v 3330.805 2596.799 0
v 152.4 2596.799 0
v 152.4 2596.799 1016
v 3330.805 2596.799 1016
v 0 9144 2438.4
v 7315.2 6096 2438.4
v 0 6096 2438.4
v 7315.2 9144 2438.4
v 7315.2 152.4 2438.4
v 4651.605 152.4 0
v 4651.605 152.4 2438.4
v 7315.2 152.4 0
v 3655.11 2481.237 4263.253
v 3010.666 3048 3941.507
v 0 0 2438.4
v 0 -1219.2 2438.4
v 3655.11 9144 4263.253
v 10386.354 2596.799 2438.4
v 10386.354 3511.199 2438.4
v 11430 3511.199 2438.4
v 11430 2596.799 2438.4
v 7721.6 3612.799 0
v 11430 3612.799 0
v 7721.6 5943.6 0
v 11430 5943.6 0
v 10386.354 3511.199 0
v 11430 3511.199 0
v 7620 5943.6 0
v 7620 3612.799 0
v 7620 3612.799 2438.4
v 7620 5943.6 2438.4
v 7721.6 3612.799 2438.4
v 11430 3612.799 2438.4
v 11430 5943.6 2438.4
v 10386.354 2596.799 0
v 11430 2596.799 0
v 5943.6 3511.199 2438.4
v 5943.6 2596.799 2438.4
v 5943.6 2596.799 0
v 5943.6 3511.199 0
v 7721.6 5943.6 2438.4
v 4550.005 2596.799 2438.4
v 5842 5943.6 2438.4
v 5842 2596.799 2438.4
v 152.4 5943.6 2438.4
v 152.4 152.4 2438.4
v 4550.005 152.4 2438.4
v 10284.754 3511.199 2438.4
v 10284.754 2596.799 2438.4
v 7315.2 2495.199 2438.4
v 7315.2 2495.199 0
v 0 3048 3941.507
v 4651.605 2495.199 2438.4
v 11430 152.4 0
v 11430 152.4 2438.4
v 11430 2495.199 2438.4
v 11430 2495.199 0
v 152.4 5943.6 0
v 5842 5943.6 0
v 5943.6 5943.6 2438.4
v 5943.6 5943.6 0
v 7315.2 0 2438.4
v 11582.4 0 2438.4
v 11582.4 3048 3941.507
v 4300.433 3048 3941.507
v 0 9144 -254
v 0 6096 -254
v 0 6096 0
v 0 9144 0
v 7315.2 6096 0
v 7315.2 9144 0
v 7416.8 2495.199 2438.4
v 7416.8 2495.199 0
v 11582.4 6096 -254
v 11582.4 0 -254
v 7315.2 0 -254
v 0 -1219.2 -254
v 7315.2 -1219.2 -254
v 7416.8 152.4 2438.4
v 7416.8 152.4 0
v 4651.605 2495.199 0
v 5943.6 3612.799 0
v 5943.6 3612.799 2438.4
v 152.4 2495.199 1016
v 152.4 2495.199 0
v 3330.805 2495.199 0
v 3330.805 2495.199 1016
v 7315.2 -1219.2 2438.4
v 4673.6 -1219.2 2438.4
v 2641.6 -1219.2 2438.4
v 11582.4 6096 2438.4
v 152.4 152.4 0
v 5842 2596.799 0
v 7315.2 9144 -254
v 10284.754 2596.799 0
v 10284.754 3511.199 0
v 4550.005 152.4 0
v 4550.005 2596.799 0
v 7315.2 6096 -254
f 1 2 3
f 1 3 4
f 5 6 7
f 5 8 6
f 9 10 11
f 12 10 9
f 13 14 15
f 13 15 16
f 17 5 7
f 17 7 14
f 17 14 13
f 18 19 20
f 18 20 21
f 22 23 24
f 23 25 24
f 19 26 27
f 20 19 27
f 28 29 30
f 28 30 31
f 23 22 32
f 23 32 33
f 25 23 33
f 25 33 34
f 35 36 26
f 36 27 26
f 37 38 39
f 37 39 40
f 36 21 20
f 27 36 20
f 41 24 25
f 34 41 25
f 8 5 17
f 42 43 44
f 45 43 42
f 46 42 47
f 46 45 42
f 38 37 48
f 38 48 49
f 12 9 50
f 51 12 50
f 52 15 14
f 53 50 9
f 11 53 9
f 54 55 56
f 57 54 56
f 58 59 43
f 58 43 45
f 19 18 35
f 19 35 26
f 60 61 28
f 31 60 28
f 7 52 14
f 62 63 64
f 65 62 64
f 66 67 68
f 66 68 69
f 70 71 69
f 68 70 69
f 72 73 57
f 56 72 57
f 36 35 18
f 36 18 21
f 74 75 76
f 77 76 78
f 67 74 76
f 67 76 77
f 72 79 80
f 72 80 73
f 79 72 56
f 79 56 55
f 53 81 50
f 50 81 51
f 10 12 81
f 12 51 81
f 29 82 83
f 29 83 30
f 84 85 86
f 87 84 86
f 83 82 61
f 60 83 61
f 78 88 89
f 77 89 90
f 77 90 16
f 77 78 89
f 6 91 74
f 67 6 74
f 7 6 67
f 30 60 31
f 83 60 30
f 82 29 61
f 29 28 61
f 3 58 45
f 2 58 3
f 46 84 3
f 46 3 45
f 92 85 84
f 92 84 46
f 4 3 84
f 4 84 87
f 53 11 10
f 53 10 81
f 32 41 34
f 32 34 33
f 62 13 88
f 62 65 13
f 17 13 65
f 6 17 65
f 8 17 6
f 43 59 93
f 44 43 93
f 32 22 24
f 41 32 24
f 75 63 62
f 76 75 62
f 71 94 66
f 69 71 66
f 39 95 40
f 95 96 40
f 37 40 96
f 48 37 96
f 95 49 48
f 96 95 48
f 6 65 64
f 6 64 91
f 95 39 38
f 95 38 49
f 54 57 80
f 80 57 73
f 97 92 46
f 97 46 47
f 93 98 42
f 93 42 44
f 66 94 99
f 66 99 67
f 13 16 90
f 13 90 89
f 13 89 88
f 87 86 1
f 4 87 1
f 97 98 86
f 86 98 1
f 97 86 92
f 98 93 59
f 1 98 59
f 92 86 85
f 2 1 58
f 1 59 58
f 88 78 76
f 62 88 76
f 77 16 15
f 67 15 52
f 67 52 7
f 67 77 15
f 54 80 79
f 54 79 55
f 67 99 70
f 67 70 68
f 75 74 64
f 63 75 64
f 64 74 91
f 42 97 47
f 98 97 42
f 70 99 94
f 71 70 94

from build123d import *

# Parameters (mm, degrees)
SKETCH3_W           = 11582.4
SKETCH3_H           = 6096
SKETCH3_W_2         = 4341.154286856
SKETCH3_H_2         = 914.4
SKETCH3_W_3         = 1676.4
SKETCH3_H_3         = 2330.801356814
SKETCH3_W_4         = 2663.595025017
SKETCH3_H_4         = 2342.798643186
SKETCH3_W_5         = 1043.645713144
SKETCH3_W_6         = 4013.2
SKETCH3_W_7         = 3708.4
BOSS_EXTRUDE1_DEPTH = 2438.4
SKETCH4_W           = 11582.4
SKETCH4_H           = 6096
BOSS_EXTRUDE2_DEPTH = 254
SKETCH5_W           = 3178.404974983
SKETCH5_H           = 101.6
BOSS_EXTRUDE3_DEPTH = 1016
BOSS_EXTRUDE4_DEPTH = 11582.4
SKETCH8_W           = 7315.2
SKETCH8_H           = 3048
BOSS_EXTRUDE6_DEPTH = 254
BOSS_EXTRUDE7_DEPTH = 10363.2
SKETCH12_W          = 7315.2
SKETCH12_H          = 1219.2
BOSS_EXTRUDE8_DEPTH = 2692.4
BOSS_EXTRUDE9_DEPTH = 1219.2
SKETCH16_W          = 8139.69628299
SKETCH16_H          = 5480.280814736
CUT_EXTRUDE3_DEPTH  = 2099.564


with BuildPart() as part:
    # Sketch3 → Boss-Extrude1 (new body)
    with BuildSketch(Plane.XY):
        with Locations((5791.2, 3048)):
            Rectangle(SKETCH3_W, SKETCH3_H)
        Polygon((152.4, 152.4), (4550.004974983, 152.4), (4550.004974983, 2596.798643186), (5842, 2596.798643186), (5842, 3511.198643186), (5842, 5943.6), (152.4, 5943.6), align=None, mode=Mode.SUBTRACT)
        with Locations((8114.177143428, 3053.998643186)):
            Rectangle(SKETCH3_W_2, SKETCH3_H_2, mode=Mode.SUBTRACT)
        with Locations((6781.8, 4778.199321593)):
            Rectangle(SKETCH3_W_3, SKETCH3_H_3, mode=Mode.SUBTRACT)
        with Locations((5983.402487492, 1323.799321593)):
            Rectangle(SKETCH3_W_4, SKETCH3_H_4, mode=Mode.SUBTRACT)
        with Locations((10908.177143428, 3053.998643186)):
            Rectangle(SKETCH3_W_5, SKETCH3_H_2, mode=Mode.SUBTRACT)
        with Locations((9423.4, 1323.799321593)):
            Rectangle(SKETCH3_W_6, SKETCH3_H_4, mode=Mode.SUBTRACT)
        with Locations((9575.8, 4778.199321593)):
            Rectangle(SKETCH3_W_7, SKETCH3_H_3, mode=Mode.SUBTRACT)
    extrude(amount=BOSS_EXTRUDE1_DEPTH)

    # Sketch4 → Boss-Extrude2 (add)
    with BuildSketch(Plane(origin=(0, 0, 0), x_dir=(-1, 0, 0), z_dir=(0, 0, -1))):
        with Locations((-5791.2, 3048)):
            Rectangle(SKETCH4_W, SKETCH4_H)
    extrude(amount=BOSS_EXTRUDE2_DEPTH)

    # Sketch5 → Boss-Extrude3 (add)
    with BuildSketch(Plane.XY):
        with Locations((1741.602487492, 2545.998643186)):
            Rectangle(SKETCH5_W, SKETCH5_H)
    extrude(amount=BOSS_EXTRUDE3_DEPTH)

    # Sketch6 → Boss-Extrude4 (add)
    with BuildSketch(Plane.ZY):
        Polygon((2438.4, 6096), (2438.4, 0), (3941.507258543, 3048), align=None)
    extrude(amount=-BOSS_EXTRUDE4_DEPTH)

    # Sketch10 → Boss-Extrude7 (add)
    with BuildSketch(Plane(origin=(0, 9144, 0), x_dir=(1, 0, 0), z_dir=(0, 1, 0))):
        Polygon((7315.2, -2438.4), (0, -2438.4), (3655.110432816, -4263.253342026), align=None)
    extrude(amount=-BOSS_EXTRUDE7_DEPTH)

    # Sketch12 → Boss-Extrude8 (add)
    with BuildSketch(Plane(origin=(0, 0, -254), x_dir=(-1, 0, 0), z_dir=(0, 0, -1))):
        with Locations((-3657.6, -609.6)):
            Rectangle(SKETCH12_W, SKETCH12_H)
    extrude(amount=-BOSS_EXTRUDE8_DEPTH)

    # Sketch15 → Boss-Extrude9 (add)
    with BuildSketch(Plane.XZ.offset(1219.2)):
        Polygon((2641.6, 2438.4), (4673.6, 2438.4), (3657.6, 3352.8), align=None)
    extrude(amount=BOSS_EXTRUDE9_DEPTH)

    # Sketch16 → Cut-Extrude3 (cut)
    with BuildSketch(Plane(origin=(0, -1205.755425359, 2445.030130489), x_dir=(1, 0, 0), z_dir=(0, -0.44228869, 0.896872742))):
        with Locations((3533.249297689, 1543.555925229)):
            Rectangle(SKETCH16_W, SKETCH16_H)
    extrude(amount=CUT_EXTRUDE3_DEPTH, mode=Mode.SUBTRACT)


with BuildPart() as body_2:
    # Sketch8 → Boss-Extrude6 (new body)
    with BuildSketch(Plane(origin=(0, 0, -254), x_dir=(-1, 0, 0), z_dir=(0, 0, -1))):
        with Locations((-3657.6, 7620)):
            Rectangle(SKETCH8_W, SKETCH8_H)
    extrude(amount=-BOSS_EXTRUDE6_DEPTH)


solid = Compound([part.part, body_2.part])
